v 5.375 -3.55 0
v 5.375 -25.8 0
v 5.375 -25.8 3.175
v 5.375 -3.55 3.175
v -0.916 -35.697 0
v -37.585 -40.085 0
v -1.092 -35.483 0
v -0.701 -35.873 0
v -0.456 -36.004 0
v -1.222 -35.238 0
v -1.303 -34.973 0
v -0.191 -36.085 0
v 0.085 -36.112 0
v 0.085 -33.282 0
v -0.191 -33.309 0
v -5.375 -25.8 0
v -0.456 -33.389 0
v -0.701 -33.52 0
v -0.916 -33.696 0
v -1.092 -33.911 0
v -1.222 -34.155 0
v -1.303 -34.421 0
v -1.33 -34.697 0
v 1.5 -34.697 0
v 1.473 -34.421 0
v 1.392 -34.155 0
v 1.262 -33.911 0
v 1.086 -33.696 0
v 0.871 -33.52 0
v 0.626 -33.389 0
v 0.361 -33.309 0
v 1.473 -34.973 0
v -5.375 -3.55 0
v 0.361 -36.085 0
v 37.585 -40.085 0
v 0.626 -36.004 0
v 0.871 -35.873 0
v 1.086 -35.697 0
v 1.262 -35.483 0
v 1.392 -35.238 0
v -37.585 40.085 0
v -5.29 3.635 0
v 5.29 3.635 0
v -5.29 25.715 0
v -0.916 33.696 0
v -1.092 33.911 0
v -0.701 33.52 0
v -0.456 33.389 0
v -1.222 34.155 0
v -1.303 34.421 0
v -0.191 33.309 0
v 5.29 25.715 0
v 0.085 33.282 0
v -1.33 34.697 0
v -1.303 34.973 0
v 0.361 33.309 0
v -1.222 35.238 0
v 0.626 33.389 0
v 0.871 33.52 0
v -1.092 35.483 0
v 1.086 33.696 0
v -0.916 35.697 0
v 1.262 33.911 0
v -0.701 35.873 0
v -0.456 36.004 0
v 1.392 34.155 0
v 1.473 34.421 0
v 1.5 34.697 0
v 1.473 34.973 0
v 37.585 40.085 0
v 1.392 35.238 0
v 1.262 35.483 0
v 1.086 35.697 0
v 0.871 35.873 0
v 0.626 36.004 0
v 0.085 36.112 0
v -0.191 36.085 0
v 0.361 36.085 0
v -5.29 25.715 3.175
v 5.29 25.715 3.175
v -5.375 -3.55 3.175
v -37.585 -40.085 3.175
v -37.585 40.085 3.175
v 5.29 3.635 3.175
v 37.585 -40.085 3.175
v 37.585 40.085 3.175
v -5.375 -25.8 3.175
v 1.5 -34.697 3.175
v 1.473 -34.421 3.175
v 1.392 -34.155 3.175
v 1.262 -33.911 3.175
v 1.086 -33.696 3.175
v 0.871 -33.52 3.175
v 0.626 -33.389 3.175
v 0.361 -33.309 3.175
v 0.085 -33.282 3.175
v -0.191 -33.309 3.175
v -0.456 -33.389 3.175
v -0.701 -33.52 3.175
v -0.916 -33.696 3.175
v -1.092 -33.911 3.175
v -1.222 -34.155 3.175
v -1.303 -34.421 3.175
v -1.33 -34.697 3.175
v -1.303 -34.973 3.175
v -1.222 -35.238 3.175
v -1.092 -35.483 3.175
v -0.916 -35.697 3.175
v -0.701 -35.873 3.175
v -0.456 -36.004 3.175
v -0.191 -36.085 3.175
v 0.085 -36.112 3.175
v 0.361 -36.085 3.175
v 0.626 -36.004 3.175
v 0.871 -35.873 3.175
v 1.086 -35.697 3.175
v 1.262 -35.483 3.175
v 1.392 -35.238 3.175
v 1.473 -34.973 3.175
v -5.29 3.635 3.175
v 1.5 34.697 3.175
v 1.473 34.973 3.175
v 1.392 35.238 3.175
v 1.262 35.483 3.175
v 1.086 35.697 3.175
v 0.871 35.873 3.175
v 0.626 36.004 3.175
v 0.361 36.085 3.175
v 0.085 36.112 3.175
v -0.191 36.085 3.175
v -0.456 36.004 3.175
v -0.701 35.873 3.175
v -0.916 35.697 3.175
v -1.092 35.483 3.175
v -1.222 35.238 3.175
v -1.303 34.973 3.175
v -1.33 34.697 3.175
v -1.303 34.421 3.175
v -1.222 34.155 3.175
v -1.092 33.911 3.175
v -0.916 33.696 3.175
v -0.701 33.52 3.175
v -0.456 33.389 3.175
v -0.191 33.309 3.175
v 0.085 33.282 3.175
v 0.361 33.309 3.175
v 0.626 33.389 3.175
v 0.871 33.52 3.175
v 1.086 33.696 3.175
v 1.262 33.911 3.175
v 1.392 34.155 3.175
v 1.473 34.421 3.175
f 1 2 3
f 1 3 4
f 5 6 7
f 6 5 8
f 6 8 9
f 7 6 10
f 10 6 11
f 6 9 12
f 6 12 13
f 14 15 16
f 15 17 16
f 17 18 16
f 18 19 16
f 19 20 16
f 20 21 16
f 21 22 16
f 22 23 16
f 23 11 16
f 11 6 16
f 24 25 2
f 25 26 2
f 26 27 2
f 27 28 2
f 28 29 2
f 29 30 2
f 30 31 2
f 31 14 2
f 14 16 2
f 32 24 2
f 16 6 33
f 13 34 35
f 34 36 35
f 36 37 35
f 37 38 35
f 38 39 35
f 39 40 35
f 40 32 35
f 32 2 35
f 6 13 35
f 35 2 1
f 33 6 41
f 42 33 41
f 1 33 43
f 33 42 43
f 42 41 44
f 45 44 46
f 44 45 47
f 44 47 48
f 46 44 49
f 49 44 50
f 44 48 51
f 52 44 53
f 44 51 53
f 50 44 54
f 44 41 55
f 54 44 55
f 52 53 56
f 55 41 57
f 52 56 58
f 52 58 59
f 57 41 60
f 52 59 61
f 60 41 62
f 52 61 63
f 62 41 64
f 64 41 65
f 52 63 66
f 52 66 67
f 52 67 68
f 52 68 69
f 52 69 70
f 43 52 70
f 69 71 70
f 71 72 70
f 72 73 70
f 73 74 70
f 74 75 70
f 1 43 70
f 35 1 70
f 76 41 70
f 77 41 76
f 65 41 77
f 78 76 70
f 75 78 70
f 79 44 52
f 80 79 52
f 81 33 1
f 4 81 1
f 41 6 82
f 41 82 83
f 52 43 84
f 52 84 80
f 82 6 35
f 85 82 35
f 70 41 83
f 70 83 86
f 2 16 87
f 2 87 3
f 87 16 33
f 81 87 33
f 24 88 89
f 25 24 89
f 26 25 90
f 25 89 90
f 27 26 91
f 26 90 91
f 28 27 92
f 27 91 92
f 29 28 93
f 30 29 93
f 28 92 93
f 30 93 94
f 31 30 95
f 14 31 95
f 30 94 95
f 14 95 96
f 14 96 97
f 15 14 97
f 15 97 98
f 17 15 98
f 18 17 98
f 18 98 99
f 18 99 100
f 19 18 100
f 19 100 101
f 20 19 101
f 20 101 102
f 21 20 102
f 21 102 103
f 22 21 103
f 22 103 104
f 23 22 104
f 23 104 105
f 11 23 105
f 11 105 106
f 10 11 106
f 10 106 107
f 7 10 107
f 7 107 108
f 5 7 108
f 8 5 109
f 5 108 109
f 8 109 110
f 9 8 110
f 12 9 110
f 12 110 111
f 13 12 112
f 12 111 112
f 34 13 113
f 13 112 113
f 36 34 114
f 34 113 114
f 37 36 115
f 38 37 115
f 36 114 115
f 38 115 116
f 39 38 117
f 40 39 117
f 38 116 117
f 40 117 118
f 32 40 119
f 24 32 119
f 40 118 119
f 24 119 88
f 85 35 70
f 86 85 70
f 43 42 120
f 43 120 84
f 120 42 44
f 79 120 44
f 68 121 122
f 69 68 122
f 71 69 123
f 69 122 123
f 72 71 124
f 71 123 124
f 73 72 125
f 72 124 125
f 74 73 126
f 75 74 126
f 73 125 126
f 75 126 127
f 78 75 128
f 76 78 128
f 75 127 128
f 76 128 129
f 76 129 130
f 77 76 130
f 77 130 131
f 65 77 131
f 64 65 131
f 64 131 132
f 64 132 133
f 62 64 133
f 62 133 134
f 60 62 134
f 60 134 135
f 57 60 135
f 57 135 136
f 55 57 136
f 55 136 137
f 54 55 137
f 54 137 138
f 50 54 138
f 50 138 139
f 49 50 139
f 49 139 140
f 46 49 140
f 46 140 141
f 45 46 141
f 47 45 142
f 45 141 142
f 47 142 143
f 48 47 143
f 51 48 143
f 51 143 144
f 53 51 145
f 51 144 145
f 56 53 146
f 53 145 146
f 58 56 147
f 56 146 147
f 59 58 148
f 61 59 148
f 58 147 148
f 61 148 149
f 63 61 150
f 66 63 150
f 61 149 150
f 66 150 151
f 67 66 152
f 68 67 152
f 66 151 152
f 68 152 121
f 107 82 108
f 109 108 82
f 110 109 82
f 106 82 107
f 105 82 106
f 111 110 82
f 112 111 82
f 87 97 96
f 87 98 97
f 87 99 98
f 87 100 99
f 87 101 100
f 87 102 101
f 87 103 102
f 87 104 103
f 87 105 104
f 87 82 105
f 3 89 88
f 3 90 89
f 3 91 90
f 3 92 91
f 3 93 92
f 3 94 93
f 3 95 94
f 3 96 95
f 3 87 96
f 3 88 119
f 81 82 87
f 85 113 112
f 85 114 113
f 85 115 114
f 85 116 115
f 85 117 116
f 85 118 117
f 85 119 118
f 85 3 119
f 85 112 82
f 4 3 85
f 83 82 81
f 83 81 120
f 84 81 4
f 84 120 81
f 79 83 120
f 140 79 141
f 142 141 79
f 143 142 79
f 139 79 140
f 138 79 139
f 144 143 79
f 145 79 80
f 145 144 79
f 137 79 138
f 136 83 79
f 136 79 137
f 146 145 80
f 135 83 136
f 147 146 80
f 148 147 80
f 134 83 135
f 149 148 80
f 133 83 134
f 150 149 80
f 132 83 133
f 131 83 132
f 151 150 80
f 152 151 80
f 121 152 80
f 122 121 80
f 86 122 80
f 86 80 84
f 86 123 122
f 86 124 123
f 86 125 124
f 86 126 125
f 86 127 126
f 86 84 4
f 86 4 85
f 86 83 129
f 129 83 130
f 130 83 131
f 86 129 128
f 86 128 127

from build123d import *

# Parameters (mm, degrees)
SKETCH1_W           = 75.17
SKETCH1_H           = 80.17
SKETCH1_W_2         = 10.75
SKETCH1_H_2         = 22.25
SKETCH1_W_3         = 10.58
SKETCH1_H_3         = 22.08
BOSS_EXTRUDE1_DEPTH = 3.175
SKETCH2_R           = 1.415
CUT_EXTRUDE1_DEPTH  = 4.175


with BuildPart() as part:
    # Sketch1 → Boss-Extrude1 (new body)
    with BuildSketch(Plane.XY):
        Rectangle(SKETCH1_W, SKETCH1_H)
        with Locations((0, -14.675)):
            Rectangle(SKETCH1_W_2, SKETCH1_H_2, mode=Mode.SUBTRACT)
        with Locations((0, 14.675)):
            Rectangle(SKETCH1_W_3, SKETCH1_H_3, mode=Mode.SUBTRACT)
    extrude(amount=BOSS_EXTRUDE1_DEPTH)

    # Sketch2 → Cut-Extrude1 (cut, through all)
    with BuildSketch(Plane.XY.offset(3.175)):
        with Locations((0.085, 34.696699141)):
            Circle(SKETCH2_R)
        with Locations((0.085, -34.696699141)):
            Circle(SKETCH2_R)
    extrude(amount=-CUT_EXTRUDE1_DEPTH, mode=Mode.SUBTRACT)


solid = part.part
